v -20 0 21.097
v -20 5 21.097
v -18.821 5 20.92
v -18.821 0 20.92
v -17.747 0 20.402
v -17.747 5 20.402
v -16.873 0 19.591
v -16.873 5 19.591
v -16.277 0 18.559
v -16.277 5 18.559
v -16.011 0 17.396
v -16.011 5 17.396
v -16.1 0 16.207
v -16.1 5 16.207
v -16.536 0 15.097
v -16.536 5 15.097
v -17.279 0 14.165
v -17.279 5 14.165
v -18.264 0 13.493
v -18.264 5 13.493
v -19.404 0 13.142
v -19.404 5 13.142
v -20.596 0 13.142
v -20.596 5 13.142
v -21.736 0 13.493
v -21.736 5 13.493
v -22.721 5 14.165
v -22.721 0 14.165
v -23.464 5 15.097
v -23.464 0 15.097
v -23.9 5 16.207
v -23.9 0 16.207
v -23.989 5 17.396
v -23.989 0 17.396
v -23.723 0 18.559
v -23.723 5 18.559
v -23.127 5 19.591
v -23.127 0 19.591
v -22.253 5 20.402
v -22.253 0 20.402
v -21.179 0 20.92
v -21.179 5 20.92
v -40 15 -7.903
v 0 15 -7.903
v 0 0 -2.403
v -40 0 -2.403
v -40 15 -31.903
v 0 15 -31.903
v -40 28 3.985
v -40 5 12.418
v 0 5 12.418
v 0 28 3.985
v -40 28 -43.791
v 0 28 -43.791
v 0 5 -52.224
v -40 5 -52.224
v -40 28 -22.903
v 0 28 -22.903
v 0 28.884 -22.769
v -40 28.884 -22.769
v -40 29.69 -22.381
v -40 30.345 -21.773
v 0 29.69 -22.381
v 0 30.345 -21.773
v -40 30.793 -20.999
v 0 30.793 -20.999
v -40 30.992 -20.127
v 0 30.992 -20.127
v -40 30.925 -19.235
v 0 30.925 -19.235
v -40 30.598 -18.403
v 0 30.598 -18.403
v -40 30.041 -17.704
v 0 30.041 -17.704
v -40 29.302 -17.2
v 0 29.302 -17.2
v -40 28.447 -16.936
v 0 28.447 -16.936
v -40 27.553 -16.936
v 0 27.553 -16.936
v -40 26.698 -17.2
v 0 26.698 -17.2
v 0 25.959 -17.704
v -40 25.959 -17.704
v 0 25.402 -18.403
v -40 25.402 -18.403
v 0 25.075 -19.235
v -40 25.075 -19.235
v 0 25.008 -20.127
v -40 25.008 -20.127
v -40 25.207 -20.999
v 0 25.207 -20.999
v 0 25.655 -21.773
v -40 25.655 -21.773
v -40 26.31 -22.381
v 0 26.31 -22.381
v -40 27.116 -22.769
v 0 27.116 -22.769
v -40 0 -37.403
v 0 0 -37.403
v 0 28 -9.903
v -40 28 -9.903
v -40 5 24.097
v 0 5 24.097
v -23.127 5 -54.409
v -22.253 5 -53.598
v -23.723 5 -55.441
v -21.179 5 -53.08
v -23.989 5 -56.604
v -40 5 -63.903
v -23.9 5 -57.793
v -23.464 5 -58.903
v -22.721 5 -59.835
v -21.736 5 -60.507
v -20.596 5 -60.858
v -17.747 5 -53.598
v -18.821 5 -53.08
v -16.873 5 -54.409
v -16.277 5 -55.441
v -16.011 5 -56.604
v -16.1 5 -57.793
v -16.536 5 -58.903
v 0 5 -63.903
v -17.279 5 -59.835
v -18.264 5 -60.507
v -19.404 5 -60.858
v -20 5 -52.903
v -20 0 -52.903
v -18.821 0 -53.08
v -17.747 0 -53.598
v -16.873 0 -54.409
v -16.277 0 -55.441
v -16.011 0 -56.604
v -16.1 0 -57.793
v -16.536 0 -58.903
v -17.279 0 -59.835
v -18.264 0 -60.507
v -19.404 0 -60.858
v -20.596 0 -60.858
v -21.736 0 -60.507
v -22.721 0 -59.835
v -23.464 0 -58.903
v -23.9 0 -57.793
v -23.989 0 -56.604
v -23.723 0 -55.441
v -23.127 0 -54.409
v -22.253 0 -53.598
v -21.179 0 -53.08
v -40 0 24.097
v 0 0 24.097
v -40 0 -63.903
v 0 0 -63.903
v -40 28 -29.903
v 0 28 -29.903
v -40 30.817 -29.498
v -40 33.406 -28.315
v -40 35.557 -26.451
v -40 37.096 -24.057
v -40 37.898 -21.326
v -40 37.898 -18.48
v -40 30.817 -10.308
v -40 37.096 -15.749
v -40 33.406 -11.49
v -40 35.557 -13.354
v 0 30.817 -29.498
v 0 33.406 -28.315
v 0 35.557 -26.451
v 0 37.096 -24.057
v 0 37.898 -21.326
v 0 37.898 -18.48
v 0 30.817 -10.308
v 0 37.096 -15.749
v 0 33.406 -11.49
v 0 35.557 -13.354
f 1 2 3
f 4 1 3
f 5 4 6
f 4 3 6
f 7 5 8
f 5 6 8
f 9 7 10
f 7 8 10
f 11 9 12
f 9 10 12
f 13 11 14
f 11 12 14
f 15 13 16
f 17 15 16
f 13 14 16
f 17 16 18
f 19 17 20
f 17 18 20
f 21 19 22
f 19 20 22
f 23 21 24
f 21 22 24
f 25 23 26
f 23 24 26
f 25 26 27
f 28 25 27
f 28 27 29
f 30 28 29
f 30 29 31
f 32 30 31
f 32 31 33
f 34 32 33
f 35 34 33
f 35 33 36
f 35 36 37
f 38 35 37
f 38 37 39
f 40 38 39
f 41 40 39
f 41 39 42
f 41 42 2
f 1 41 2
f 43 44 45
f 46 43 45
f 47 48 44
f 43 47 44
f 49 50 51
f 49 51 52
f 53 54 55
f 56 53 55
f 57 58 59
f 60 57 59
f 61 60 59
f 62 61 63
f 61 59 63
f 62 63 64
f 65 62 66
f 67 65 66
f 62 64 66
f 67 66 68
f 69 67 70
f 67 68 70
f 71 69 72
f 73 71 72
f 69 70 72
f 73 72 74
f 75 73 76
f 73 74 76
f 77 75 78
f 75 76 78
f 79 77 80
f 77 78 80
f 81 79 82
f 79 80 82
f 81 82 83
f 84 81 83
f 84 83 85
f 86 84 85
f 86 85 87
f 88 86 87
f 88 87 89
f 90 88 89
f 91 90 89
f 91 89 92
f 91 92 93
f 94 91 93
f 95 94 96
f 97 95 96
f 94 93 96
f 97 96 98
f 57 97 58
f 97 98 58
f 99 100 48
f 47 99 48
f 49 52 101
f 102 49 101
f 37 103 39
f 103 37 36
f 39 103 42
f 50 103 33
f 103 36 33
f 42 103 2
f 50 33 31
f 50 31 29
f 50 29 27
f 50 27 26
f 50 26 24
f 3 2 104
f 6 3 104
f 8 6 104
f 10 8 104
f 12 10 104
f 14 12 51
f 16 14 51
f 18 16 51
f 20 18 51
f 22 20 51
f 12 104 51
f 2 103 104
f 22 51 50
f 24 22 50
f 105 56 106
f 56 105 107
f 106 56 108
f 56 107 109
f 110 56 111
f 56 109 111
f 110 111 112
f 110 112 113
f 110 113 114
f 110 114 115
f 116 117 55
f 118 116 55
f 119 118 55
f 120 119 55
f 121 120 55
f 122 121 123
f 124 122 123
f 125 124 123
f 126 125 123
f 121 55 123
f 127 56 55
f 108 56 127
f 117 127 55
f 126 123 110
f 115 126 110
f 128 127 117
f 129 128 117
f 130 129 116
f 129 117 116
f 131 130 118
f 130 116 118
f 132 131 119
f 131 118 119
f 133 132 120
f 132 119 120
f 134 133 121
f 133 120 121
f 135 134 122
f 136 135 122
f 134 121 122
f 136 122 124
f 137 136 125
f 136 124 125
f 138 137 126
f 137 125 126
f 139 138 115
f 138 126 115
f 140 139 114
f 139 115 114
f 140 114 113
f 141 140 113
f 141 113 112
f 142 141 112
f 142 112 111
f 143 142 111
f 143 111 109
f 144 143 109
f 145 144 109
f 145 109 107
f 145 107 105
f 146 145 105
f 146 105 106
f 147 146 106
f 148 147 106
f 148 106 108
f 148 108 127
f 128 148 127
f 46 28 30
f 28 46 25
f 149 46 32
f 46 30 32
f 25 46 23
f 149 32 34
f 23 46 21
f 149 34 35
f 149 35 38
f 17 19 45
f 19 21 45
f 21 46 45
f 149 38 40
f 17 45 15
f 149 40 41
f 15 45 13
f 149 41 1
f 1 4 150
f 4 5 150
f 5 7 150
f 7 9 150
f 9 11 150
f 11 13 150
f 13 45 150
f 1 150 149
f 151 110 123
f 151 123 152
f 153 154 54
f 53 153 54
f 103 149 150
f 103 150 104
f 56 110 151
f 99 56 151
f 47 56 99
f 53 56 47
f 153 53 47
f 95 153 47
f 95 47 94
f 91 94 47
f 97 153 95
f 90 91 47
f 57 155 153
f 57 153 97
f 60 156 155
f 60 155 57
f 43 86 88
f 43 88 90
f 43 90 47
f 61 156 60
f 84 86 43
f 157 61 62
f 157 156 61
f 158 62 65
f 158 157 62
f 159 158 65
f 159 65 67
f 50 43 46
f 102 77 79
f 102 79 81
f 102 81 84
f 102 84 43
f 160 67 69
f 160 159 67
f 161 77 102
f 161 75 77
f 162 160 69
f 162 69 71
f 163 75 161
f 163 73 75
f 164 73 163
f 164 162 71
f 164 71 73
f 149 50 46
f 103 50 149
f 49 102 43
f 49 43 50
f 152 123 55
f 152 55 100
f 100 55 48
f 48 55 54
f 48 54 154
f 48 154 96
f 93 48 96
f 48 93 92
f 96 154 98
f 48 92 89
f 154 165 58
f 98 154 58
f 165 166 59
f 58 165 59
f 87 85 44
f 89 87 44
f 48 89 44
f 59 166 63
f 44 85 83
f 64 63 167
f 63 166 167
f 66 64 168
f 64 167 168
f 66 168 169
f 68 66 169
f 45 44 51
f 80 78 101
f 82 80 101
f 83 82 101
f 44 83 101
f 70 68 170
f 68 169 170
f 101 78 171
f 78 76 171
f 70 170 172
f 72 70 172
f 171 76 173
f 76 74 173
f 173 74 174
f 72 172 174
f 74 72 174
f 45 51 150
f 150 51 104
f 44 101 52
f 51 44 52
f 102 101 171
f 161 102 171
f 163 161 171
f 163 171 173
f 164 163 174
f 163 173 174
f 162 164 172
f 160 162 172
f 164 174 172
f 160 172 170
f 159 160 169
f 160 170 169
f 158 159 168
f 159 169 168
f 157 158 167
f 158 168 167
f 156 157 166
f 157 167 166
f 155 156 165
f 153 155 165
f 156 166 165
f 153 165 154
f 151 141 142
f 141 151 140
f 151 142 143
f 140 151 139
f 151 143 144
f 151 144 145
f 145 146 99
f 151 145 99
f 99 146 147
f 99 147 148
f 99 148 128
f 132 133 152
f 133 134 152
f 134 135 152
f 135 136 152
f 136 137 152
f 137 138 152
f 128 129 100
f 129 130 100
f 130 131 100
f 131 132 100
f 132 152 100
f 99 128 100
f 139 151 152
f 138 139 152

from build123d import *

# Parameters (mm, degrees)
SKETCH1_R           = 3
BOSS_EXTRUDE1_DEPTH = 40
SKETCH2_R           = 4
CUT_EXTRUDE1_DEPTH  = 40


with BuildPart() as part:
    # Sketch1 → Boss-Extrude1 (new body)
    with BuildSketch(Plane(origin=(0, 0, 0), x_dir=(0, 0, -1), z_dir=(1, 0, 0))):
        with BuildLine():
            Line((-24.097227121, 0), (-24.097227121, 5))
            Line((-24.097227121, 5), (-12.418356006, 5))
            Line((-12.418356006, 5), (-3.985022672, 28))
            Line((-3.985022672, 28), (9.902772879, 28))
            ThreePointArc((9.902772879, 28), (19.902772879, 38), (29.902772879, 28))
            Line((29.902772879, 28), (43.79056843, 28))
            Line((43.79056843, 28), (52.223901764, 5))
            Line((52.223901764, 5), (63.902772879, 5))
            Line((63.902772879, 5), (63.902772879, 0))
            Line((63.902772879, 0), (37.402772879, 0))
            Line((37.402772879, 0), (31.902772879, 15))
            Line((31.902772879, 15), (7.902772879, 15))
            Line((7.902772879, 15), (2.402772879, 0))
            Line((2.402772879, 0), (-24.097227121, 0))
        make_face()
        with Locations((19.902772879, 28)):
            Circle(SKETCH1_R, mode=Mode.SUBTRACT)
    extrude(amount=-BOSS_EXTRUDE1_DEPTH)

    # Sketch2 → Cut-Extrude1 (cut)
    with BuildSketch(Plane(origin=(0, 5, 0), x_dir=(1, 0, 0), z_dir=(0, 1, 0))):
        with Locations(Location((-20, -17.097227121, 0), (0, 0, 270))):
            Circle(SKETCH2_R)
        with Locations(Location((-20, 56.902772879, 0), (0, 0, 270))):
            Circle(SKETCH2_R)
    extrude(amount=-CUT_EXTRUDE1_DEPTH, mode=Mode.SUBTRACT)


solid = part.part
